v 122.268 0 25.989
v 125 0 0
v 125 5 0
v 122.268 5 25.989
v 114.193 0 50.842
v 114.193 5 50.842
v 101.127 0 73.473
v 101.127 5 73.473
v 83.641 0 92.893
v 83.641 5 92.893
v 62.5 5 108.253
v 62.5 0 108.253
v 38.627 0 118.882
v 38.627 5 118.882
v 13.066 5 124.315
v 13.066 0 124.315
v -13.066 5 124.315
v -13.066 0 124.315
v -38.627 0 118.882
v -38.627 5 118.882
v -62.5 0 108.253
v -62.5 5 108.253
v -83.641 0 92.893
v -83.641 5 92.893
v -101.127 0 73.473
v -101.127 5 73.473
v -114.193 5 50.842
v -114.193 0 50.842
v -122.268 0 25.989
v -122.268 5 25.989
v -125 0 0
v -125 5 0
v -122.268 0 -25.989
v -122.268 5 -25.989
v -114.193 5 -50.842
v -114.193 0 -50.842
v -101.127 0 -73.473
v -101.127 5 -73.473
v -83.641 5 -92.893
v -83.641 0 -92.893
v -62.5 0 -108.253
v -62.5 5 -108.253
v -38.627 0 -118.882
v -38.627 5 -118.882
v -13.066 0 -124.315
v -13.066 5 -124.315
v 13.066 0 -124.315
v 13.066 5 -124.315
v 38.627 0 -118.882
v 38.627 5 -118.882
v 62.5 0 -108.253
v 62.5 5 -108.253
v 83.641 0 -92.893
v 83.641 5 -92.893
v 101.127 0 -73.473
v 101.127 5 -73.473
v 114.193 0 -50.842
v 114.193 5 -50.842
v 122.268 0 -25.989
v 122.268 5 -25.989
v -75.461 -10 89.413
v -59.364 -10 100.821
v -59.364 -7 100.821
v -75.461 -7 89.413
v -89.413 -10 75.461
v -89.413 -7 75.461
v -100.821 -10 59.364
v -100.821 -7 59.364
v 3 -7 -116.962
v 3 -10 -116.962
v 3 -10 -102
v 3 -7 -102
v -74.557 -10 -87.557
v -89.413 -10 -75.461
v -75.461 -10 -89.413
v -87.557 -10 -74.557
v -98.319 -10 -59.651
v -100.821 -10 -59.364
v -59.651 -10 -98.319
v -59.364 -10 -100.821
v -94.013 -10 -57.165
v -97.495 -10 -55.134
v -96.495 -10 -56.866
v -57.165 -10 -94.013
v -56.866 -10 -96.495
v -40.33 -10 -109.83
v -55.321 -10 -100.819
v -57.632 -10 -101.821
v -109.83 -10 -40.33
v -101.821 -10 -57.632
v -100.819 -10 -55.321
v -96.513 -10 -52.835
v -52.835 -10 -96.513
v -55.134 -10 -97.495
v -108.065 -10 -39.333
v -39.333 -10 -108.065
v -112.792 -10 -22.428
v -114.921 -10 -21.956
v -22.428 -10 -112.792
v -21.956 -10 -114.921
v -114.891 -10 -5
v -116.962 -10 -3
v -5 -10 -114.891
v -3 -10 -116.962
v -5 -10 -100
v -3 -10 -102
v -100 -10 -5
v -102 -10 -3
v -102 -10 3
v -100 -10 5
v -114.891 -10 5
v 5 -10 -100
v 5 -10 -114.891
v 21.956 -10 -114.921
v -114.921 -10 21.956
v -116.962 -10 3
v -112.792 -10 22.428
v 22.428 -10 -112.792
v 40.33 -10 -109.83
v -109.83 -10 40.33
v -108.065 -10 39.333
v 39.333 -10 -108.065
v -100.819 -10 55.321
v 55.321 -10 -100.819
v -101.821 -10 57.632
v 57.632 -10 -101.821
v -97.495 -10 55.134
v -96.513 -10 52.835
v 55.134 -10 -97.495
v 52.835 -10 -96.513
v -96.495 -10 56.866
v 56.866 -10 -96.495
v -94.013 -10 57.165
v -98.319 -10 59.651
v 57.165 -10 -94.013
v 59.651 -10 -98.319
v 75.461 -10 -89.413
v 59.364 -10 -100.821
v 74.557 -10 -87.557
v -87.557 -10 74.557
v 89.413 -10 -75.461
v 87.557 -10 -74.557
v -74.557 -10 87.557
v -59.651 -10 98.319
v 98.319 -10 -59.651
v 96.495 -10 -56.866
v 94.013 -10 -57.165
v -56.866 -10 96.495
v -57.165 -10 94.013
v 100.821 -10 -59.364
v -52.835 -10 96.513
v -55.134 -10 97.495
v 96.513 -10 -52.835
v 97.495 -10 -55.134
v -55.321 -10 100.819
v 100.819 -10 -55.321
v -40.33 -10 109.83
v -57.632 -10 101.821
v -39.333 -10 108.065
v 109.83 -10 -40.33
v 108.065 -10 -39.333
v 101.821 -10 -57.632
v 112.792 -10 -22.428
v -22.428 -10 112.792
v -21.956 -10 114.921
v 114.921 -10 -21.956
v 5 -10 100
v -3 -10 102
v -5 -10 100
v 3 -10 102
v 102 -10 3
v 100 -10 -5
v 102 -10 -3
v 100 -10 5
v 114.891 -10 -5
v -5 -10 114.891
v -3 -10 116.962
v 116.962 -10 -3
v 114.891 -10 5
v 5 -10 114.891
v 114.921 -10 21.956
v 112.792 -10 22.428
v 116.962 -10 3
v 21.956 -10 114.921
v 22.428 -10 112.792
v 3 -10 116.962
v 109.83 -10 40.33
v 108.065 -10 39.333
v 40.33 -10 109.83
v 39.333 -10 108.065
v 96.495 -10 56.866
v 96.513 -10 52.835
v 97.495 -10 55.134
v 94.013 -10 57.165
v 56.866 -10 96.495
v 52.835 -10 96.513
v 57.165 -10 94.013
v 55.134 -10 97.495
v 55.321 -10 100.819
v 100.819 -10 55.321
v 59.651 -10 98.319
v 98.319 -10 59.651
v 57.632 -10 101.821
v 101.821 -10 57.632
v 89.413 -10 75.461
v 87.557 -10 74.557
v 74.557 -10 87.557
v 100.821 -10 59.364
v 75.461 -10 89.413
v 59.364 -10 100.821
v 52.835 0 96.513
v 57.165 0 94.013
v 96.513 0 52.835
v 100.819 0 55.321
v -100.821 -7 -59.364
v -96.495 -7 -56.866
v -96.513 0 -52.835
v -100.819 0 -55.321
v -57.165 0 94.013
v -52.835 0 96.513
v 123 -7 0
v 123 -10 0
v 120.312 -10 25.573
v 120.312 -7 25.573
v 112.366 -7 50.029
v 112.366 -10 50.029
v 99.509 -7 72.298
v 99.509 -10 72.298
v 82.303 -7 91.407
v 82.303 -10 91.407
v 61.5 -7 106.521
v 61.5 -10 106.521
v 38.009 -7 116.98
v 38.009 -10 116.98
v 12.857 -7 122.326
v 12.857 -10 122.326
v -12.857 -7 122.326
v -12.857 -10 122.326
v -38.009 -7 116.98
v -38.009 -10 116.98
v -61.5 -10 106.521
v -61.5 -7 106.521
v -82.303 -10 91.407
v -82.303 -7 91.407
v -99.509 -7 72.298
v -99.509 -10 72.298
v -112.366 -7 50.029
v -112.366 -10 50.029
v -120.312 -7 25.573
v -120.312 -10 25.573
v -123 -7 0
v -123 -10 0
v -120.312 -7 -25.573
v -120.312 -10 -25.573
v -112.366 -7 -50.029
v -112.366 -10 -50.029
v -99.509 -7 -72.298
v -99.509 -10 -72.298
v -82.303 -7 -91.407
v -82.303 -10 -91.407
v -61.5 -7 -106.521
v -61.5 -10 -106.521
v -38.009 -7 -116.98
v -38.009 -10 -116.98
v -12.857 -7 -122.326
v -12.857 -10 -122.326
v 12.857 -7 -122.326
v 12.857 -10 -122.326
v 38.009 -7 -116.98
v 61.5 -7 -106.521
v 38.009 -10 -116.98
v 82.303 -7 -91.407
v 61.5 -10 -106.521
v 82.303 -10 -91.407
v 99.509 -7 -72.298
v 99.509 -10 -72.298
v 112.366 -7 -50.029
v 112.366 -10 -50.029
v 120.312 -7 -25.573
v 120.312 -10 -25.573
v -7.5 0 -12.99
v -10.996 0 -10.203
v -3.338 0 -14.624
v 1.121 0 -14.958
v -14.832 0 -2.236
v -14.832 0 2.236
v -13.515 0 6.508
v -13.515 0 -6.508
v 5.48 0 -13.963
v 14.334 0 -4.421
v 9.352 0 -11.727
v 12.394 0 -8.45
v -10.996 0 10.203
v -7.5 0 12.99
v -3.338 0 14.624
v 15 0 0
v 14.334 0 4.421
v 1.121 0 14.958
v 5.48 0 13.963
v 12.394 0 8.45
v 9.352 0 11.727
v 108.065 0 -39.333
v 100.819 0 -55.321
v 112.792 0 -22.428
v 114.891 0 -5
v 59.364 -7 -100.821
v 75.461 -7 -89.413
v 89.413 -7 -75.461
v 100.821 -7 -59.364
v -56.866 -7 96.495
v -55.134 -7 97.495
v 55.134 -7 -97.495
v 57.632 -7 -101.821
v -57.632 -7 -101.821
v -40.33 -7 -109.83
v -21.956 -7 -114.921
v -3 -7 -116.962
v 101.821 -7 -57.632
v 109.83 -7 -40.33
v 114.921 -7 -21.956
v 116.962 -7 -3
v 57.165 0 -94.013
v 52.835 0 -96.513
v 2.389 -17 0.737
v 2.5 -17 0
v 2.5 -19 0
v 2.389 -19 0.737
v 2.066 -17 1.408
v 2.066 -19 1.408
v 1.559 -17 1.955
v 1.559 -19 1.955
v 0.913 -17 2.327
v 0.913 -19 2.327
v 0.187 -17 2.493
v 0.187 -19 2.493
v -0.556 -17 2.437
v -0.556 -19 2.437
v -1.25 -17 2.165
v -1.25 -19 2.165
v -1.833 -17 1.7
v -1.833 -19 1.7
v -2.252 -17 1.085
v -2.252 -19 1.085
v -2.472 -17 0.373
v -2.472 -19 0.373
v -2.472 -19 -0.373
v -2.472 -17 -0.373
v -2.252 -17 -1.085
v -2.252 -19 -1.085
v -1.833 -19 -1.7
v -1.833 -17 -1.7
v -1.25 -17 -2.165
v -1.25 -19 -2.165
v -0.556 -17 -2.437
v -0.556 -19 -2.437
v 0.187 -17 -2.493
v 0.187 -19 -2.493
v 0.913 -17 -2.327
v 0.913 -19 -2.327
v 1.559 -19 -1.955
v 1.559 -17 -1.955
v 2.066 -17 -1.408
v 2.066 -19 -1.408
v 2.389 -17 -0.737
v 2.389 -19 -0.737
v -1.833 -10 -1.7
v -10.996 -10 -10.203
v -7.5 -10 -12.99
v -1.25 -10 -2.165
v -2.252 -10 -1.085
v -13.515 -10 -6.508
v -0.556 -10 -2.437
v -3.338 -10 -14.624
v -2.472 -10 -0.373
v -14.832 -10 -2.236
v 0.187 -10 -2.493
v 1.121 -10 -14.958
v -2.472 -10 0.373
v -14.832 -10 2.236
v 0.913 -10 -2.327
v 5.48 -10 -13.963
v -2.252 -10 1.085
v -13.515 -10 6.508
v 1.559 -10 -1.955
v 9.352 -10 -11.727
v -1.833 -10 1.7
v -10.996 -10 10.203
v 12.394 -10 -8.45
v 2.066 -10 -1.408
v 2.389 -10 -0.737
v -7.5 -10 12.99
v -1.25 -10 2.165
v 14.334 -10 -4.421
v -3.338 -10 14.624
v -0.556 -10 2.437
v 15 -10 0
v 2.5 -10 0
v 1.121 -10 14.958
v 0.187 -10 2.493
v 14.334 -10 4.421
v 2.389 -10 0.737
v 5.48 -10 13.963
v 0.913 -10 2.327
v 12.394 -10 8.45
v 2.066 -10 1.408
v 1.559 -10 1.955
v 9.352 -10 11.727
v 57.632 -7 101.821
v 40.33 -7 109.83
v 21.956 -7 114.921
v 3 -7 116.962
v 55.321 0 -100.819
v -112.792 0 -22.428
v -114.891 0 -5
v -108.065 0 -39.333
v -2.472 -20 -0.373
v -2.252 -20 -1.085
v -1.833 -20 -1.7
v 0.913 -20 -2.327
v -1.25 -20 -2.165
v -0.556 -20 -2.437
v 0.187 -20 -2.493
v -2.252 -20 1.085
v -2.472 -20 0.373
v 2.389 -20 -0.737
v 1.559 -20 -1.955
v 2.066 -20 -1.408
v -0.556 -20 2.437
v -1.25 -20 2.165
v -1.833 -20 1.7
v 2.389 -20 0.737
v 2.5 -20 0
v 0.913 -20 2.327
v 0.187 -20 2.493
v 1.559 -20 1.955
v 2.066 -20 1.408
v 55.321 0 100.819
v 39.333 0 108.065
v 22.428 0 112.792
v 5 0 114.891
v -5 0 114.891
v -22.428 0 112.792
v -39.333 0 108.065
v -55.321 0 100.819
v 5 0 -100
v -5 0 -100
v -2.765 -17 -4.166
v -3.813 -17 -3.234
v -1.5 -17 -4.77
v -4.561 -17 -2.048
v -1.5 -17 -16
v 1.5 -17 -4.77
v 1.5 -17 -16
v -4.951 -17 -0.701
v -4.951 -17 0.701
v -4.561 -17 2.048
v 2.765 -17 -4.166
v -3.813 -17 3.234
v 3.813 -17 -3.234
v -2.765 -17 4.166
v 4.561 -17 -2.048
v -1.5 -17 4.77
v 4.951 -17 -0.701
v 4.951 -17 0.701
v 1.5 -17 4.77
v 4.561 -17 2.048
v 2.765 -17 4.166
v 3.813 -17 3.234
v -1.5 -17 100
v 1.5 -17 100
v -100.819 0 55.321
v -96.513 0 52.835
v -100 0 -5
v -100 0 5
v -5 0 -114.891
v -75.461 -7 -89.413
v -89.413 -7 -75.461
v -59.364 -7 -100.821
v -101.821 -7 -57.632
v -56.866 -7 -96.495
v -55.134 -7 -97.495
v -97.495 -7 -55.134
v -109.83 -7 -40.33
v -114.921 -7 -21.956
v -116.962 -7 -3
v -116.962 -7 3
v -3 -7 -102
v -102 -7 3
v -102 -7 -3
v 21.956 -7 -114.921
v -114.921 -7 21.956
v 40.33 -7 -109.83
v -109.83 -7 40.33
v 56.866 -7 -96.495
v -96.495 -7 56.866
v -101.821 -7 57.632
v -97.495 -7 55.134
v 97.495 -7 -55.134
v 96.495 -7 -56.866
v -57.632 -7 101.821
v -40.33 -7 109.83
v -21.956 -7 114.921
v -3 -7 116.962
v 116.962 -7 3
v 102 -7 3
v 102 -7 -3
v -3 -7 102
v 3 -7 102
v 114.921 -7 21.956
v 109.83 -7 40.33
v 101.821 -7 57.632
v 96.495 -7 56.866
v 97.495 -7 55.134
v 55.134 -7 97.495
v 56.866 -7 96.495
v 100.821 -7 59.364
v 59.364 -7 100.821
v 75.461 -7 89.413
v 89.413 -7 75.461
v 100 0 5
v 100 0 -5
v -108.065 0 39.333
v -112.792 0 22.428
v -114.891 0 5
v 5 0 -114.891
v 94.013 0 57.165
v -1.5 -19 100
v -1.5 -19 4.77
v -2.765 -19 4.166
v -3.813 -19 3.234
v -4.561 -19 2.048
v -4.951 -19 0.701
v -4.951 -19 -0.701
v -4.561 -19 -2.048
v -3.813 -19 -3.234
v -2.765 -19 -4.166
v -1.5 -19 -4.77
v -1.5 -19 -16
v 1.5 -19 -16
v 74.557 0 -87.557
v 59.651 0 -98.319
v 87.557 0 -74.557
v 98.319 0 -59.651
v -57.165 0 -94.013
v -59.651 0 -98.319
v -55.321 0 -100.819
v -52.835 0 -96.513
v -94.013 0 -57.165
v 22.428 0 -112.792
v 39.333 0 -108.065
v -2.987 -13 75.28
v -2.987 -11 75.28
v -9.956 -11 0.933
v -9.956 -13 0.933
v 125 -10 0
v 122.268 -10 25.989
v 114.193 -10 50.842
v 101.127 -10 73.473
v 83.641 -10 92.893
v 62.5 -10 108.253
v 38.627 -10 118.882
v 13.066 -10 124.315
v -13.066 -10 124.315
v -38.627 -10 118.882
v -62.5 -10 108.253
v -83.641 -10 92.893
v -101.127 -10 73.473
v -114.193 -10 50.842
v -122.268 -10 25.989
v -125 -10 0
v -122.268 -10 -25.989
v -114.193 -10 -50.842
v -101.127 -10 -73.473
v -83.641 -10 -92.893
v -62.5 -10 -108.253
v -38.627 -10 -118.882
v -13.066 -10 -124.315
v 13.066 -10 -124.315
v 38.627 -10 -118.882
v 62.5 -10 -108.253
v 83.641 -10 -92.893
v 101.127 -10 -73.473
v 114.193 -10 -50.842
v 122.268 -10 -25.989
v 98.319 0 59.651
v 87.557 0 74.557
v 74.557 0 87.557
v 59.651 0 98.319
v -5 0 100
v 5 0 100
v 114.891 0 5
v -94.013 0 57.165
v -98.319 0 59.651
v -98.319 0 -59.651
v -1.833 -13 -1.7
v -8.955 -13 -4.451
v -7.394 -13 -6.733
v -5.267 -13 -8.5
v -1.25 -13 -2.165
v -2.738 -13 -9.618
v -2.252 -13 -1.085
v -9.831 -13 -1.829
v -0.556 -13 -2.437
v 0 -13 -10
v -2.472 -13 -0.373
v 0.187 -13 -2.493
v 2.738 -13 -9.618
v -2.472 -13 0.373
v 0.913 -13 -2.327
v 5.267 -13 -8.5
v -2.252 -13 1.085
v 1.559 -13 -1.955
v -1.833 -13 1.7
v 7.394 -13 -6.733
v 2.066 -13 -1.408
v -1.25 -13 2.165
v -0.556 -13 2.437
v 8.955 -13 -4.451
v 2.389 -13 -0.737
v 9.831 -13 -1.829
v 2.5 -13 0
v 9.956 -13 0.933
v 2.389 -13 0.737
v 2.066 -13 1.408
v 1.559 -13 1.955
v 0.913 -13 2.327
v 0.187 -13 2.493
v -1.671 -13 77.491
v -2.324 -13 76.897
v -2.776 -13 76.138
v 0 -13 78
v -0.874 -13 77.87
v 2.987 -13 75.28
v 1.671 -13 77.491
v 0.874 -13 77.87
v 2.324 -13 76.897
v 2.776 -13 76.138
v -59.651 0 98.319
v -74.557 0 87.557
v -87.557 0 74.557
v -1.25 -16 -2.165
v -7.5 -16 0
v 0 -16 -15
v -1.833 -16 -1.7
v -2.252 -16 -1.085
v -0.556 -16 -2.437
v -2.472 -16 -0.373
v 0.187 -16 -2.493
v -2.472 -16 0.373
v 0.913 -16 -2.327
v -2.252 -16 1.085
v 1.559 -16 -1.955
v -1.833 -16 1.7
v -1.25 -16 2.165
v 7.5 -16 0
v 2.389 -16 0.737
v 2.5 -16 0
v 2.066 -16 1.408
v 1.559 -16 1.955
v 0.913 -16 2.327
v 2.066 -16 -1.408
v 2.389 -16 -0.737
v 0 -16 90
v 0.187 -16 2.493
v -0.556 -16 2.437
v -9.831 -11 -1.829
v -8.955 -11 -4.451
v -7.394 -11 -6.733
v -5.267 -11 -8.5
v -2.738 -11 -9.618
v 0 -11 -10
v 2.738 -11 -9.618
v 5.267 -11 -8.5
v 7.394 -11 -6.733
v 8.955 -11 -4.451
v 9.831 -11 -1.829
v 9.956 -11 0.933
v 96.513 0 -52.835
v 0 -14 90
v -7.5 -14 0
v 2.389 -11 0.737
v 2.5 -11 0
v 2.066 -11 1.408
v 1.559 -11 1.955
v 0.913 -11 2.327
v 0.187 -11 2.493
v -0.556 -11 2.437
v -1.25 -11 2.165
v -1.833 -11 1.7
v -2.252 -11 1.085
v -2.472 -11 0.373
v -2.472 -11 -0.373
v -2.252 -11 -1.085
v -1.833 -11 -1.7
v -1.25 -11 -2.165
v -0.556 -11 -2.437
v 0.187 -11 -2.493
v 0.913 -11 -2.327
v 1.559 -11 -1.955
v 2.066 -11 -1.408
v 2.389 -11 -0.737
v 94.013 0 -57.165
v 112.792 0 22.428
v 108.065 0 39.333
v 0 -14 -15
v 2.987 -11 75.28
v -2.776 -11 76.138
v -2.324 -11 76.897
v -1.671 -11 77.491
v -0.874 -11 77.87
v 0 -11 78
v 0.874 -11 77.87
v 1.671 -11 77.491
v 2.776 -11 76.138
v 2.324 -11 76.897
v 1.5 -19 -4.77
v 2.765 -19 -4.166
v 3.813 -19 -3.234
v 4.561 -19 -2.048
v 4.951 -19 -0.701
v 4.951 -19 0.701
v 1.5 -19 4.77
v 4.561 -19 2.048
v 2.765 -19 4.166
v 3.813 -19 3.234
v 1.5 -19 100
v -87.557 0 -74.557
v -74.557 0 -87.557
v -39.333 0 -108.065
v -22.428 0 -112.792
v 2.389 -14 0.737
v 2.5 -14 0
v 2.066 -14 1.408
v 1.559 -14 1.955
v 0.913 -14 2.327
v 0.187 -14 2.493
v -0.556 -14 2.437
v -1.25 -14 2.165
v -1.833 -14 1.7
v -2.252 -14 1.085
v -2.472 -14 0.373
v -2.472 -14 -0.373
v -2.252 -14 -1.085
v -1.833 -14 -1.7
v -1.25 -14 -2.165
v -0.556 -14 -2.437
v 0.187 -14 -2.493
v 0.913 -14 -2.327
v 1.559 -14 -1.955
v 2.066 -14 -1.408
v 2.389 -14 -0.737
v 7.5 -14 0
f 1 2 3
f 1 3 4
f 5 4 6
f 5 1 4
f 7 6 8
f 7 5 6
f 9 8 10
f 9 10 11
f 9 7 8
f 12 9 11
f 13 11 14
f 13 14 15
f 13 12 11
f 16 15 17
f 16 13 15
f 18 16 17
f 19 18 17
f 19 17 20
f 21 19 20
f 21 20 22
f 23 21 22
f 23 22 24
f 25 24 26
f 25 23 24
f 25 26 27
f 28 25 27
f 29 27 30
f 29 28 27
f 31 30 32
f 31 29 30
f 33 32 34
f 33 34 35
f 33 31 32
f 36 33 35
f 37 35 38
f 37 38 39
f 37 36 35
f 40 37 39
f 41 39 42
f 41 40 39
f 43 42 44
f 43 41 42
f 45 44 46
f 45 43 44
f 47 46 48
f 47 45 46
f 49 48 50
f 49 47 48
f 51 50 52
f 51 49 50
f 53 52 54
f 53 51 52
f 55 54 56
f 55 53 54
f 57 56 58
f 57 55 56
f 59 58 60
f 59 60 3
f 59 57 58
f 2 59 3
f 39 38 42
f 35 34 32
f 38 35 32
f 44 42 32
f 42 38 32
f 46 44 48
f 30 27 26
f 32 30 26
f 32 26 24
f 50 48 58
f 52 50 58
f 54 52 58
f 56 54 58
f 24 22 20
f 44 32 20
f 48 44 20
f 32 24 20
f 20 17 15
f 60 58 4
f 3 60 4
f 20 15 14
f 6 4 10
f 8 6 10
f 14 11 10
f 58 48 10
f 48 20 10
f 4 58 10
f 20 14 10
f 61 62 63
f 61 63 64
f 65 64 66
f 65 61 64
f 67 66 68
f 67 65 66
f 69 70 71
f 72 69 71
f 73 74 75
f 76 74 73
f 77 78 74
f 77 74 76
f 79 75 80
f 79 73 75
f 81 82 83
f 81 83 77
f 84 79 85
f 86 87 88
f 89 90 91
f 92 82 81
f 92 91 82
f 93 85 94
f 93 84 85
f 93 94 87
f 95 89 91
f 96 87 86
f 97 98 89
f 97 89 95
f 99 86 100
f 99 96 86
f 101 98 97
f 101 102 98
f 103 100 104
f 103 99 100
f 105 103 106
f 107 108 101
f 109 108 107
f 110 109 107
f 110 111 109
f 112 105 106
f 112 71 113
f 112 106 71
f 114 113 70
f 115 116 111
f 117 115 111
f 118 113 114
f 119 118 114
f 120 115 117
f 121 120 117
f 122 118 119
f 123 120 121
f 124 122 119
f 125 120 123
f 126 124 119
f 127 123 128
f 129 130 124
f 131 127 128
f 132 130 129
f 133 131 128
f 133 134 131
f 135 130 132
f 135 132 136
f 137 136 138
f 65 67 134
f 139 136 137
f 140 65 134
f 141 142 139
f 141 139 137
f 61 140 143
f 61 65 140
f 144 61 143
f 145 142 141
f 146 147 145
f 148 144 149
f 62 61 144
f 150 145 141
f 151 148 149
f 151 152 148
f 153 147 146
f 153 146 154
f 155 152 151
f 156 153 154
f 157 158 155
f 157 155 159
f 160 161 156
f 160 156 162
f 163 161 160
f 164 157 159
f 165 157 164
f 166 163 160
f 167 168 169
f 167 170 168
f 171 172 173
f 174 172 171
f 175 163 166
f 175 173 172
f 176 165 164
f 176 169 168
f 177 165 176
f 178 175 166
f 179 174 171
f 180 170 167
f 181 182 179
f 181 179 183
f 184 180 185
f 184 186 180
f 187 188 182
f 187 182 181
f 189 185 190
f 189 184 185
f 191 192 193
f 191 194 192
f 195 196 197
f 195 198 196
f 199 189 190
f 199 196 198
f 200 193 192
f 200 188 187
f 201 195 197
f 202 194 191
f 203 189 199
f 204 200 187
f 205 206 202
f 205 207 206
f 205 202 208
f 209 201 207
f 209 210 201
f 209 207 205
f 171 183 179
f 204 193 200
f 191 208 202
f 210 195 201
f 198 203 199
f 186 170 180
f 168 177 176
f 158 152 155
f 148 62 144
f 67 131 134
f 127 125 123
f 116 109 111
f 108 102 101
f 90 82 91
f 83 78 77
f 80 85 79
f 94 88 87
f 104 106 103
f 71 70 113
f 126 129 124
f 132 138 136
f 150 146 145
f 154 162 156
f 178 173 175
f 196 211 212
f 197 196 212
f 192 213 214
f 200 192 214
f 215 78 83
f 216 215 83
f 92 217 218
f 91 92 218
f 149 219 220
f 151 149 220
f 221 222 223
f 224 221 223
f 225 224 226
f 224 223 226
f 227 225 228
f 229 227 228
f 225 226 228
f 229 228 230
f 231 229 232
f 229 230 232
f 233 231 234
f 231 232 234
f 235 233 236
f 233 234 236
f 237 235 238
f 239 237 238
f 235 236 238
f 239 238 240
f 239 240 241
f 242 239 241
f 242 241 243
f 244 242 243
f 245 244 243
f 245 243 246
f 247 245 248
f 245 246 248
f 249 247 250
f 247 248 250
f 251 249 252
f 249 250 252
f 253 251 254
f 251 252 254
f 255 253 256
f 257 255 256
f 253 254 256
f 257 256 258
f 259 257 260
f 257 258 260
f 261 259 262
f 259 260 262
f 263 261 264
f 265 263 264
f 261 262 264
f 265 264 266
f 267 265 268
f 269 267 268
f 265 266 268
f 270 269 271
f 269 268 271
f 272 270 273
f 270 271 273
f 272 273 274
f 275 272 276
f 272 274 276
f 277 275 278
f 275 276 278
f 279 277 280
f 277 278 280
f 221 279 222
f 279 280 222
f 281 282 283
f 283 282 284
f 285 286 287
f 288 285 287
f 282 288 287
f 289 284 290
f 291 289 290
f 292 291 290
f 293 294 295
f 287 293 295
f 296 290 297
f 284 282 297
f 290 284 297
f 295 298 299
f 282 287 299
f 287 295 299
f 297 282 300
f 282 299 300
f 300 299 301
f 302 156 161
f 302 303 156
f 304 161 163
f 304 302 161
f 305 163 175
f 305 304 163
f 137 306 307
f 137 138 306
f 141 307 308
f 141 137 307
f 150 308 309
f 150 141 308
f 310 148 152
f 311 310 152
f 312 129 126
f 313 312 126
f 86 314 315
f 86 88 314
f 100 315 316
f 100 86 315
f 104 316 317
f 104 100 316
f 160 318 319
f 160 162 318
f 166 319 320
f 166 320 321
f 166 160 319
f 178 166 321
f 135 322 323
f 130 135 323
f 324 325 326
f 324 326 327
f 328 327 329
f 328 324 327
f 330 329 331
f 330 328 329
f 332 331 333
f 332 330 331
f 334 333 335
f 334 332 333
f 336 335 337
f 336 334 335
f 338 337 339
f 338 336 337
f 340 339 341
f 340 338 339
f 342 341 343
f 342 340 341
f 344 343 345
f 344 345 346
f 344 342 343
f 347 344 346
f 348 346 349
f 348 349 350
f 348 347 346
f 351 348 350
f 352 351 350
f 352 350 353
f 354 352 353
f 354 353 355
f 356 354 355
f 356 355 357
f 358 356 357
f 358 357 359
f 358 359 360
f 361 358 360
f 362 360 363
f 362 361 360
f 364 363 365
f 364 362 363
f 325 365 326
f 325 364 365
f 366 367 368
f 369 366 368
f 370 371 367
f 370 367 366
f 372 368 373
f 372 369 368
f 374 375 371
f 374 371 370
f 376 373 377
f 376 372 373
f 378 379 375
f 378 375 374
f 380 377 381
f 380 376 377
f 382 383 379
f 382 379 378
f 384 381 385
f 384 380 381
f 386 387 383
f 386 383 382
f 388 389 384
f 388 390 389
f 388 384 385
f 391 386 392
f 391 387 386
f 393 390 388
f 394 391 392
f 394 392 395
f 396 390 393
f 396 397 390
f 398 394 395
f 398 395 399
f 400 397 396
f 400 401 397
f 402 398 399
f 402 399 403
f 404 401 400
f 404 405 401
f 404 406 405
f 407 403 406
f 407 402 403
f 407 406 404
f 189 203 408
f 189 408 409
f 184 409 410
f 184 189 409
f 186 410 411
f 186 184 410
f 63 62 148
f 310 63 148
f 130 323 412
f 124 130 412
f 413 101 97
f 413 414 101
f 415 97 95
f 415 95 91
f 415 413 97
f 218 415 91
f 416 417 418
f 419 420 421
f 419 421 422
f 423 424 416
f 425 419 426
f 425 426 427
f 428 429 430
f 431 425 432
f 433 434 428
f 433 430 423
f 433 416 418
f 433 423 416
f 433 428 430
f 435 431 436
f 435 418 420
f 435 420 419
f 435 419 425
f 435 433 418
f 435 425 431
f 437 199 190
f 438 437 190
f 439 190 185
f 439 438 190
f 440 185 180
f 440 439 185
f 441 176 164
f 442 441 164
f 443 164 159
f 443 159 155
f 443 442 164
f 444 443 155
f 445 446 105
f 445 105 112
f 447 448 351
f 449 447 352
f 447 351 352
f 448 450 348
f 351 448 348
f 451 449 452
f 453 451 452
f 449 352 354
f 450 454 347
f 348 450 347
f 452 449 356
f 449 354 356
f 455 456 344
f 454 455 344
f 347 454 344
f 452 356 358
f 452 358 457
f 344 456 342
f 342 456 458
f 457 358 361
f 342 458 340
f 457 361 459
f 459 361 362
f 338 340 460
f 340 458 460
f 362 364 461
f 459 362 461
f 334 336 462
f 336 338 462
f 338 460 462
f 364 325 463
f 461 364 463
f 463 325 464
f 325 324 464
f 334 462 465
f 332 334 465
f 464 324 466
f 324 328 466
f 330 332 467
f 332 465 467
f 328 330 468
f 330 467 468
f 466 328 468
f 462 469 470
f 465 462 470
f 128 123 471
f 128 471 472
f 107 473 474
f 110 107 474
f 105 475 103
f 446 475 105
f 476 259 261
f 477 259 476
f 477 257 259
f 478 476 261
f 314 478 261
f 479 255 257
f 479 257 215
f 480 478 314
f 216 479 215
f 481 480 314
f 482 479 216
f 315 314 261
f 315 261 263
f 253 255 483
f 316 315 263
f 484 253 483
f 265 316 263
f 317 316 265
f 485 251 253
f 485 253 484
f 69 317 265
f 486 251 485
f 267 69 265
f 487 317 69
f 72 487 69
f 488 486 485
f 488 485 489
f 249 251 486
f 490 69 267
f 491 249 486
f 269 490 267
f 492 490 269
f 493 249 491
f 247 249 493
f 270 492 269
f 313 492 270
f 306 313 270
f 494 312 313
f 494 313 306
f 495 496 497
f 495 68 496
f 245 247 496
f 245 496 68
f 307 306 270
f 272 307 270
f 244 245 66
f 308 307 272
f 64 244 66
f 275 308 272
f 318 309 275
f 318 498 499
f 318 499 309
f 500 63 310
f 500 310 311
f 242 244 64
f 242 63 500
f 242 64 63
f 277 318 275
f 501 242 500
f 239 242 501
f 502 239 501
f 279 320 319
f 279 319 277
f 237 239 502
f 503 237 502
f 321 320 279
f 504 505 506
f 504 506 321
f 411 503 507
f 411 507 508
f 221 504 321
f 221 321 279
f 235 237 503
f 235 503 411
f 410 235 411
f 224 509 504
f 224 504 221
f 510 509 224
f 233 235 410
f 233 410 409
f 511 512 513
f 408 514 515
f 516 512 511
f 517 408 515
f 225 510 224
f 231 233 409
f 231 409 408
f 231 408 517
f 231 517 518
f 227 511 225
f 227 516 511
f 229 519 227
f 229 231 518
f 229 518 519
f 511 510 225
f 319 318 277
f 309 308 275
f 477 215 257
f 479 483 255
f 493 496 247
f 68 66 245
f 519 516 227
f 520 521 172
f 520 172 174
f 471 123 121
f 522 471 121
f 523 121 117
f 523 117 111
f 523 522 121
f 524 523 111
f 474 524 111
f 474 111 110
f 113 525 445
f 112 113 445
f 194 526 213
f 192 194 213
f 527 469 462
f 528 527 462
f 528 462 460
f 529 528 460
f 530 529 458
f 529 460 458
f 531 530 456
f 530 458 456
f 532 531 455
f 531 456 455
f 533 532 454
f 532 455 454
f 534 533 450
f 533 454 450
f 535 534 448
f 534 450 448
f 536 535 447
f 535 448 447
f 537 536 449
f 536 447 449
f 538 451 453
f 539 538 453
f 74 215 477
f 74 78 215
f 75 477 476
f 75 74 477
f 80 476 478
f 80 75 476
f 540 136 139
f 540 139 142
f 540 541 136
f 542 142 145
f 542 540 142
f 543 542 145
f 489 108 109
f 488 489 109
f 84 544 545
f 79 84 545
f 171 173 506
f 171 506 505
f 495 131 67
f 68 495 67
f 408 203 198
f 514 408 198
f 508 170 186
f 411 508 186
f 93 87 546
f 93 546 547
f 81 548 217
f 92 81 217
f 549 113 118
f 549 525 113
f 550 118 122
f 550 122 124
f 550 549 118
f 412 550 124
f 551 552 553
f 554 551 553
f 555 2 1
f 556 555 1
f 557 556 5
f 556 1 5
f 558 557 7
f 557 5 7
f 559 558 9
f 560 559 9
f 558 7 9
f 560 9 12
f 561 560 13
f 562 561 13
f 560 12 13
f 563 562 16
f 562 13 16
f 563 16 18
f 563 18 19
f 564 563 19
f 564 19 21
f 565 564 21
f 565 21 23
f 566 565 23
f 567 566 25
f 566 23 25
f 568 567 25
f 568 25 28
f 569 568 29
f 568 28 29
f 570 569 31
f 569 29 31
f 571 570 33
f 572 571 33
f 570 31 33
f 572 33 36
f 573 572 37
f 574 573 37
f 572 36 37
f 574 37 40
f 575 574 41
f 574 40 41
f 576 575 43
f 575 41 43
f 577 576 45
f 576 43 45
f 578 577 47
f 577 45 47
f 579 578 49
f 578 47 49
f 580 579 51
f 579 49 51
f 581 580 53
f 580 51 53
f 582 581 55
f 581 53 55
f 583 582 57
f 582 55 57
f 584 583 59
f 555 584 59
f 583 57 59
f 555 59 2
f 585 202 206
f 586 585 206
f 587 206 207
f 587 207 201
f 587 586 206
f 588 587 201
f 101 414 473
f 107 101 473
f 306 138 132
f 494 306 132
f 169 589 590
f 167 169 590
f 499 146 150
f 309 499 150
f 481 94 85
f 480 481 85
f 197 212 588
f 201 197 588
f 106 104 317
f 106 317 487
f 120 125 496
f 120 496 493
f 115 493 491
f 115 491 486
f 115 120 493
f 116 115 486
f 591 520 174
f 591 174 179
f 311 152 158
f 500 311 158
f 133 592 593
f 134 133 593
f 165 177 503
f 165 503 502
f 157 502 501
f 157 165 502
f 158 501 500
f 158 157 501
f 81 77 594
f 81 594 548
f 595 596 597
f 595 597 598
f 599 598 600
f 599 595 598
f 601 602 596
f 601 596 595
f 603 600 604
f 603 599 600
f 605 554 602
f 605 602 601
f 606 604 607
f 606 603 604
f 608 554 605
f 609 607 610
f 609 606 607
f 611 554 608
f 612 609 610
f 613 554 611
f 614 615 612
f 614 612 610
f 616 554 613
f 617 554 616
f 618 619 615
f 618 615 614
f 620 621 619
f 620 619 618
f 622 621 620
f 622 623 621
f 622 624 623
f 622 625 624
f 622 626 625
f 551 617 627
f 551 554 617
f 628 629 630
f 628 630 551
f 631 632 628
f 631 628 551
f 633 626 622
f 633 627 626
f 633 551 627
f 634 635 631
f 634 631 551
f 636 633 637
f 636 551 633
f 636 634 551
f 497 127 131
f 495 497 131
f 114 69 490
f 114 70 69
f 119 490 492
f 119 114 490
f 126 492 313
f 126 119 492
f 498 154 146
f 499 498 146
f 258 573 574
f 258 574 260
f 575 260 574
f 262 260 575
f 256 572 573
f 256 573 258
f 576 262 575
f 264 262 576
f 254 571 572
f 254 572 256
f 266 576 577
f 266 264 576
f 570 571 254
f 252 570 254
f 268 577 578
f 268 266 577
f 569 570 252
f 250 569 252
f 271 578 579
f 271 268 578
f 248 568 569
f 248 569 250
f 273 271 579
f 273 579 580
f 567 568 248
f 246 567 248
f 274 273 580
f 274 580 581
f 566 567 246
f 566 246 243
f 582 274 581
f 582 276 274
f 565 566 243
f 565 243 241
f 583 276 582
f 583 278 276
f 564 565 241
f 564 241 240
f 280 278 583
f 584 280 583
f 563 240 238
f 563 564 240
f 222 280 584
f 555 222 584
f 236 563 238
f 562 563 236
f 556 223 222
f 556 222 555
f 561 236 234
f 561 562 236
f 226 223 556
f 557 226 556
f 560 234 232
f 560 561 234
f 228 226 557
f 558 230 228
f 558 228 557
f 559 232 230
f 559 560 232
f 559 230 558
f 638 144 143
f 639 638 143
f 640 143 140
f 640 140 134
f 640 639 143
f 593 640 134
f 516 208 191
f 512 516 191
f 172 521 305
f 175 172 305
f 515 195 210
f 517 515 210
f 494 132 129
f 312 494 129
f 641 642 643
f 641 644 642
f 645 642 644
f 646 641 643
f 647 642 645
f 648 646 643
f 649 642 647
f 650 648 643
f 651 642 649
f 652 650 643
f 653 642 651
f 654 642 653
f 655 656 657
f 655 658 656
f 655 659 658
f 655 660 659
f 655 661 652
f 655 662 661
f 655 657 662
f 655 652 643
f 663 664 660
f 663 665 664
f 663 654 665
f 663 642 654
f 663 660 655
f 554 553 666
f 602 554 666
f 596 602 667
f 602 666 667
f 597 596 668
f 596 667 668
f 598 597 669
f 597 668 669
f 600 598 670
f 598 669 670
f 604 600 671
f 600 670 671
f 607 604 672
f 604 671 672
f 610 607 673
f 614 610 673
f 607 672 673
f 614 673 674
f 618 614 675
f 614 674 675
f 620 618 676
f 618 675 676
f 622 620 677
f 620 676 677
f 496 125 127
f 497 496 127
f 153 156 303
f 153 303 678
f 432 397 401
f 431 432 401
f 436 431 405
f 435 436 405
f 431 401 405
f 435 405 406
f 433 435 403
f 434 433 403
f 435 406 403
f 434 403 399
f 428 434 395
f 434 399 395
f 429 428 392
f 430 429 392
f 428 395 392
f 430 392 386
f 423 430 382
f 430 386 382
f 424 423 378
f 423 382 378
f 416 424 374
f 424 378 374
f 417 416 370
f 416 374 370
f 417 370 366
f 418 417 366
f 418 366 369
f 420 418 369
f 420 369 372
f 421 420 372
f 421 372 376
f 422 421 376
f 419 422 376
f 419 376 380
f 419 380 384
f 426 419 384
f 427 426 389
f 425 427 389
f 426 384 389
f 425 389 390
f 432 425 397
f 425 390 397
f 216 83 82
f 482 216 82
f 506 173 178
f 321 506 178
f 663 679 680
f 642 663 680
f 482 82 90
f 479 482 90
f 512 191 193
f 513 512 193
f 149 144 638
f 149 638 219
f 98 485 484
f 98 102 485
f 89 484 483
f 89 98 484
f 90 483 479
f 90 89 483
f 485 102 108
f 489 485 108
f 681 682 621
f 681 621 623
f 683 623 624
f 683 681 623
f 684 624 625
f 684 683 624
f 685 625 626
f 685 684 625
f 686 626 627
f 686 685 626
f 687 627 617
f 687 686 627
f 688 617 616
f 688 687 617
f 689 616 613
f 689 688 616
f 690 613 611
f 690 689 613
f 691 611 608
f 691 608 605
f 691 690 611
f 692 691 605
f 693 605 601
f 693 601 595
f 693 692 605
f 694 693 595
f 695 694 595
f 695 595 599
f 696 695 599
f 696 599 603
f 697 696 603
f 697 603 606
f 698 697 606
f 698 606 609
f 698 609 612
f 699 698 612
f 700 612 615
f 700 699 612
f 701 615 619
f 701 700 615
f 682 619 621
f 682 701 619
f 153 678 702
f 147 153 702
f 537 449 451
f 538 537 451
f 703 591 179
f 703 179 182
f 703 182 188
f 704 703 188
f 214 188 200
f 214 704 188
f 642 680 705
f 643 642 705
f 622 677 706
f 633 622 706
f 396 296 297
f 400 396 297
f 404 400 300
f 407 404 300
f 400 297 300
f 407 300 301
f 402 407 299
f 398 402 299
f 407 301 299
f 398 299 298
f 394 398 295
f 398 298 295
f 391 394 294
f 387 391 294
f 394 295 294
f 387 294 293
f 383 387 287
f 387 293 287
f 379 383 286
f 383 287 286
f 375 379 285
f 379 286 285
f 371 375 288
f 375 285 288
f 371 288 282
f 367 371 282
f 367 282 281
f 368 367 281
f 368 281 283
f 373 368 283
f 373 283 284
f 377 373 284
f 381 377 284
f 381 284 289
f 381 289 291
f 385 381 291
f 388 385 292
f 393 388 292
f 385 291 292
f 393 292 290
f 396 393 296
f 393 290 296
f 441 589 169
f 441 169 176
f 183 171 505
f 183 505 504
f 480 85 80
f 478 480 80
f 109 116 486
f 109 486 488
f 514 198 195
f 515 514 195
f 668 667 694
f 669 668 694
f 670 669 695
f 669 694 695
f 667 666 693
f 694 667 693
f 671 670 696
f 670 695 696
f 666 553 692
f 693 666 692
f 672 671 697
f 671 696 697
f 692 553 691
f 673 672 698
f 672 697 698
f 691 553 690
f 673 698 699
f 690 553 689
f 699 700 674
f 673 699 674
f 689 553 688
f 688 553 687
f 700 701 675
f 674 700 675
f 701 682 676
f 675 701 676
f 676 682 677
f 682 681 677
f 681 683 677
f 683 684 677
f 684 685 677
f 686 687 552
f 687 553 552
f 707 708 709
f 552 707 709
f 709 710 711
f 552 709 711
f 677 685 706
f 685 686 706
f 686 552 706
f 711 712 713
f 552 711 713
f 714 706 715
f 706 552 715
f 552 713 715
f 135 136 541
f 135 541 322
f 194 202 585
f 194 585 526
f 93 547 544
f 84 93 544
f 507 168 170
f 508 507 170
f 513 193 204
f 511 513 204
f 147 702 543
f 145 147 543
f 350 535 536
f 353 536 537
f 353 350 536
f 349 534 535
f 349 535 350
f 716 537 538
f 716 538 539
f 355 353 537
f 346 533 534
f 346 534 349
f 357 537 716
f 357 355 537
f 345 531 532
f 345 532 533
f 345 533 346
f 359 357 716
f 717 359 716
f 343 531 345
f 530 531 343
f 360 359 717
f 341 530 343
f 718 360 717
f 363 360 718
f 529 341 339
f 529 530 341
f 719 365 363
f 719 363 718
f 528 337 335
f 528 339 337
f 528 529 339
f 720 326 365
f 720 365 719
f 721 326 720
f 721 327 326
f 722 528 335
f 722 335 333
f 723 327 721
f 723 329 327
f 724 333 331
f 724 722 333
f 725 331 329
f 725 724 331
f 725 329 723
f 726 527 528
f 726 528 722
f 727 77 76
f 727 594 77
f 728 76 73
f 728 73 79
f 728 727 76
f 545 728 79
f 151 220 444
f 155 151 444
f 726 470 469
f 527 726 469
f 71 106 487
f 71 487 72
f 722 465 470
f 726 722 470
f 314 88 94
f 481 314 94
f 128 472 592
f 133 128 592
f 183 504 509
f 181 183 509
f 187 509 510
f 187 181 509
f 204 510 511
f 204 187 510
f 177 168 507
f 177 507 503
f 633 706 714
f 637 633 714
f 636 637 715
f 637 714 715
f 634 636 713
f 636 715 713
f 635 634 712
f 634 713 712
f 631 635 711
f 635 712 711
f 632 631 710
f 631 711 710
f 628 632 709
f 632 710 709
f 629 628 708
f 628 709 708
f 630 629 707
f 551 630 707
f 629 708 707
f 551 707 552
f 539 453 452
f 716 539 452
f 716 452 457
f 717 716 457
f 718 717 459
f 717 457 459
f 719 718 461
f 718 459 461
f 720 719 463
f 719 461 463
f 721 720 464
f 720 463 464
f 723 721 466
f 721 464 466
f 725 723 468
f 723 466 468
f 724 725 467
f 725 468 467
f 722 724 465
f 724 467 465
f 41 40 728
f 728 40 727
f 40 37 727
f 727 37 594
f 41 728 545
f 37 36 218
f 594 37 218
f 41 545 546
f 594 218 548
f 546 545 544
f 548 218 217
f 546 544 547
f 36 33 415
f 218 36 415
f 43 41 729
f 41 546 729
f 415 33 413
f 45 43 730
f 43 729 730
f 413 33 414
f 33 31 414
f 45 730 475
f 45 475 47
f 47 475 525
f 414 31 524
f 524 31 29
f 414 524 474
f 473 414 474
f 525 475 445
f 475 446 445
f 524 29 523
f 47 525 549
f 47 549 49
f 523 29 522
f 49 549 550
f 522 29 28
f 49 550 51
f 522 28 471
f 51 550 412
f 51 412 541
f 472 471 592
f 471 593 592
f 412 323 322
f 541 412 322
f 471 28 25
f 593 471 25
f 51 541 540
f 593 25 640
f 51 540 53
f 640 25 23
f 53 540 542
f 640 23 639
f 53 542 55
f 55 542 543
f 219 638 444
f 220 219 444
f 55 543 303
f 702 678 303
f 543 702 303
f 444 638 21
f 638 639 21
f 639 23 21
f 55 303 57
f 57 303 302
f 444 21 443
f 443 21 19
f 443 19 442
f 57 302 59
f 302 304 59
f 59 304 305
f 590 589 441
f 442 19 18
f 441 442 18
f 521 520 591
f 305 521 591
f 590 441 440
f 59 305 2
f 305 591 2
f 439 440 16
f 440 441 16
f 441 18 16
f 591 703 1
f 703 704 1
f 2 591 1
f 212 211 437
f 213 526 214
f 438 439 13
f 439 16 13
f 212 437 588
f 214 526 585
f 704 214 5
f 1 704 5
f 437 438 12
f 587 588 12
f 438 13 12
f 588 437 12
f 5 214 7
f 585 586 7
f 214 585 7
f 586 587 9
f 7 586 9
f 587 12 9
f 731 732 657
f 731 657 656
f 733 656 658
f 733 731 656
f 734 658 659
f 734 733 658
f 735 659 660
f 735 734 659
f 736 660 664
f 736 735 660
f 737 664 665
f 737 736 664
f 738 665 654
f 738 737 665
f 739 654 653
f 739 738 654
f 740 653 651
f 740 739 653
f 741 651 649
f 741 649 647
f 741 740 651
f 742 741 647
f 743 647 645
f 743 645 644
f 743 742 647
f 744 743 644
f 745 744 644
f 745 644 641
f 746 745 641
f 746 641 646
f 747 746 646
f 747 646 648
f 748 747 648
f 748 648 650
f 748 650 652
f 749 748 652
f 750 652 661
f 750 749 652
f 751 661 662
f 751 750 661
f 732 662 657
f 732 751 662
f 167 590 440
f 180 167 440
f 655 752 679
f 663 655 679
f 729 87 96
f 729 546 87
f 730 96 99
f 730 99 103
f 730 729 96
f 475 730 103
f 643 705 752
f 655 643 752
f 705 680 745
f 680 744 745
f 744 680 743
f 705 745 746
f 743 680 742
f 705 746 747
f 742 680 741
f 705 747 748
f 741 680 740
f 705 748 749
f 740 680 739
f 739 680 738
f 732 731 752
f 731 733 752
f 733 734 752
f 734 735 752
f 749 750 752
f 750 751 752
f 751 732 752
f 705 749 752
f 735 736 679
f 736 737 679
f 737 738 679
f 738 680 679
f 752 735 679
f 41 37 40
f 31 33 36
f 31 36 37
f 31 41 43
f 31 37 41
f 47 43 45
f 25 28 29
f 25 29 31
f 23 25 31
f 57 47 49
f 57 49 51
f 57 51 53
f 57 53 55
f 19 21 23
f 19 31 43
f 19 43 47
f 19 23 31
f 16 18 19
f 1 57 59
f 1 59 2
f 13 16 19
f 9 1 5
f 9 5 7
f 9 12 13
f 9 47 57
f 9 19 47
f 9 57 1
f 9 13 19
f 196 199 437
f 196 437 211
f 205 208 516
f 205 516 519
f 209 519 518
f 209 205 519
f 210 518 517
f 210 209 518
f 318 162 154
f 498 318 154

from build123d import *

# Parameters (mm, degrees)
F0_R      = 125
F1_DEPTH  = 5
F2_R      = 15
F3_DEPTH  = 10
F4_R      = 2.5
F5_DEPTH  = 10
F6_R      = 125
F6_R_2    = 115
F7_DEPTH  = 10
F8_W      = 10
F8_H      = 20
F8_W_2    = 20
F8_H_2    = 10
F9_DEPTH  = 10
F11_DEPTH = 10
F12_R     = 123
F12_R_2   = 117
F13_DEPTH = 3
F14_W     = 6
F14_H     = 18
F14_W_2   = 18
F14_H_2   = 6
F15_DEPTH = 3
F17_DEPTH = 3
F19_R     = 2.5
F20_DEPTH = 2
F22_R     = 2.5
F23_DEPTH = 2
F25_R     = 2.5
F26_DEPTH = 2


with BuildPart() as f1:
    # F0 (on Front) → F1 (new body)
    with BuildSketch(Plane.XZ):
        Circle(F0_R)
    extrude(amount=-F1_DEPTH)


with BuildPart() as f3:
    # F2 (on face) → F3 (new body)
    with BuildSketch(Plane.XZ):
        Circle(F2_R)
    extrude(amount=F3_DEPTH)

    # F4 (on face) → F5 (join)
    with BuildSketch(Plane.XZ.offset(10)):
        Circle(F4_R)
    extrude(amount=F5_DEPTH)


with BuildPart() as f7:
    # F6 (on face) → F7 (new body)
    with BuildSketch(Plane.XZ):
        Circle(F6_R)
        Circle(F6_R_2, mode=Mode.SUBTRACT)
    extrude(amount=F7_DEPTH)

    # F8 (on face) → F9 (join)
    with BuildSketch(Plane.XZ):
        with Locations((0, 110)):
            Rectangle(F8_W, F8_H)
        with Locations((-110, 0)):
            Rectangle(F8_W_2, F8_H_2)
        with Locations((0, -110)):
            Rectangle(F8_W, F8_H)
        with Locations((110, 0)):
            Rectangle(F8_W_2, F8_H_2)
    extrude(amount=F9_DEPTH)

    # F10 (on face) → F11 (join)
    with BuildSketch(Plane.XZ):
        Polygon((62.1650635095, 102.6730484541), (57.8349364905, 105.1730484541), (52.8349364905, 96.5127944163), (57.1650635095, 94.0127944163), align=None)
        Polygon((105.1730484541, 57.8349364905), (102.6730484541, 62.1650635095), (94.0127944163, 57.1650635095), (96.5127944163, 52.8349364905), align=None)
        Polygon((-102.6730484541, 62.1650635095), (-105.1730484541, 57.8349364905), (-96.5127944163, 52.8349364905), (-94.0127944163, 57.1650635095), align=None)
        Polygon((-57.8349364905, 105.1730484541), (-62.1650635095, 102.6730484541), (-57.1650635095, 94.0127944163), (-52.8349364905, 96.5127944163), align=None)
        Polygon((-62.1650635095, -102.6730484541), (-57.8349364905, -105.1730484541), (-52.8349364905, -96.5127944163), (-57.1650635095, -94.0127944163), align=None)
        Polygon((-105.1730484541, -57.8349364905), (-102.6730484541, -62.1650635095), (-94.0127944163, -57.1650635095), (-96.5127944163, -52.8349364905), align=None)
        Polygon((102.6730484541, -62.1650635095), (105.1730484541, -57.8349364905), (96.5127944163, -52.8349364905), (94.0127944163, -57.1650635095), align=None)
        Polygon((57.8349364905, -105.1730484541), (62.1650635095, -102.6730484541), (57.1650635095, -94.0127944163), (52.8349364905, -96.5127944163), align=None)
    extrude(amount=F11_DEPTH)

    # F12 (on face) → F13 (cut)
    with BuildSketch(Plane.XZ.offset(10)):
        Circle(F12_R)
        Circle(F12_R_2, mode=Mode.SUBTRACT)
    extrude(amount=-F13_DEPTH, mode=Mode.SUBTRACT)

    # F14 (on face) → F15 (cut)
    with BuildSketch(Plane.XZ.offset(10)):
        with Locations((0, 111)):
            Rectangle(F14_W, F14_H)
        with Locations((-111, 0)):
            Rectangle(F14_W_2, F14_H_2)
        with Locations((0, -111)):
            Rectangle(F14_W, F14_H)
        with Locations((111, 0)):
            Rectangle(F14_W_2, F14_H_2)
    extrude(amount=-F15_DEPTH, mode=Mode.SUBTRACT)

    # F16 (on face) → F17 (cut)
    with BuildSketch(Plane.XZ.offset(10)):
        Polygon((60.142679841, 102.1701771879), (58.4106290334, 103.1701771879), (55.1339745962, 97.4948452239), (56.8660254038, 96.4948452239), align=None)
        Polygon((103.1701771879, 58.4106290334), (102.1701771879, 60.142679841), (96.4948452239, 56.8660254038), (97.4948452239, 55.1339745962), align=None)
        Polygon((-55.1339745962, 97.4948452239), (-58.4106290334, 103.1701771879), (-60.142679841, 102.1701771879), (-56.8660254038, 96.4948452239), align=None)
        Polygon((-96.4948452239, 56.8660254038), (-102.1701771879, 60.142679841), (-103.1701771879, 58.4106290334), (-97.4948452239, 55.1339745962), align=None)
        Polygon((-97.4948452239, -55.1339745962), (-103.1701771879, -58.4106290334), (-102.1701771879, -60.142679841), (-96.4948452239, -56.8660254038), align=None)
        Polygon((-56.8660254038, -96.4948452239), (-60.142679841, -102.1701771879), (-58.4106290334, -103.1701771879), (-55.1339745962, -97.4948452239), align=None)
        Polygon((55.1339745962, -97.4948452239), (58.4106290334, -103.1701771879), (60.142679841, -102.1701771879), (56.8660254038, -96.4948452239), align=None)
        Polygon((96.4948452239, -56.8660254038), (102.1701771879, -60.142679841), (103.1701771879, -58.4106290334), (97.4948452239, -55.1339745962), align=None)
    extrude(amount=-F17_DEPTH, mode=Mode.SUBTRACT)


with BuildPart() as f20:
    # F19 (on offset) → F20 (new body)
    with BuildSketch(Plane.XZ.offset(11)):
        with BuildLine():
            ThreePointArc((2.9869047524, 75.28), (0, 78), (-2.9869047524, 75.28))
            Line((-2.9869047524, 75.28), (-9.9563491747, 0.9333333333))
            ThreePointArc((-9.9563491747, 0.9333333333), (0, -10), (9.9563491747, 0.9333333333))
            Line((9.9563491747, 0.9333333333), (2.9869047524, 75.28))
        make_face()
        Circle(F19_R, mode=Mode.SUBTRACT)
    extrude(amount=F20_DEPTH)


with BuildPart() as f23:
    # F22 (on offset) → F23 (new body)
    with BuildSketch(Plane.XZ.offset(14)):
        Polygon((7.5, 0), (0, 90), (-7.5, 0), (0, -15), align=None)
        Circle(F22_R, mode=Mode.SUBTRACT)
    extrude(amount=F23_DEPTH)


with BuildPart() as f26:
    # F25 (on offset) → F26 (new body)
    with BuildSketch(Plane.XZ.offset(17)):
        with BuildLine():
            Line((1.5, -16), (1.5, -4.7696960071))
            ThreePointArc((1.5, -4.7696960071), (5, 0), (1.5, 4.7696960071))
            Line((1.5, 4.7696960071), (1.5, 100))
            Line((1.5, 100), (-1.5, 100))
            Line((-1.5, 100), (-1.5, 4.7696960071))
            ThreePointArc((-1.5, 4.7696960071), (-5, 0), (-1.5, -4.7696960071))
            Line((-1.5, -4.7696960071), (-1.5, -16))
            Line((-1.5, -16), (1.5, -16))
        make_face()
        Circle(F25_R, mode=Mode.SUBTRACT)
    extrude(amount=F26_DEPTH)


solid = Compound([f1.part, f3.part, f7.part, f20.part, f23.part, f26.part])
